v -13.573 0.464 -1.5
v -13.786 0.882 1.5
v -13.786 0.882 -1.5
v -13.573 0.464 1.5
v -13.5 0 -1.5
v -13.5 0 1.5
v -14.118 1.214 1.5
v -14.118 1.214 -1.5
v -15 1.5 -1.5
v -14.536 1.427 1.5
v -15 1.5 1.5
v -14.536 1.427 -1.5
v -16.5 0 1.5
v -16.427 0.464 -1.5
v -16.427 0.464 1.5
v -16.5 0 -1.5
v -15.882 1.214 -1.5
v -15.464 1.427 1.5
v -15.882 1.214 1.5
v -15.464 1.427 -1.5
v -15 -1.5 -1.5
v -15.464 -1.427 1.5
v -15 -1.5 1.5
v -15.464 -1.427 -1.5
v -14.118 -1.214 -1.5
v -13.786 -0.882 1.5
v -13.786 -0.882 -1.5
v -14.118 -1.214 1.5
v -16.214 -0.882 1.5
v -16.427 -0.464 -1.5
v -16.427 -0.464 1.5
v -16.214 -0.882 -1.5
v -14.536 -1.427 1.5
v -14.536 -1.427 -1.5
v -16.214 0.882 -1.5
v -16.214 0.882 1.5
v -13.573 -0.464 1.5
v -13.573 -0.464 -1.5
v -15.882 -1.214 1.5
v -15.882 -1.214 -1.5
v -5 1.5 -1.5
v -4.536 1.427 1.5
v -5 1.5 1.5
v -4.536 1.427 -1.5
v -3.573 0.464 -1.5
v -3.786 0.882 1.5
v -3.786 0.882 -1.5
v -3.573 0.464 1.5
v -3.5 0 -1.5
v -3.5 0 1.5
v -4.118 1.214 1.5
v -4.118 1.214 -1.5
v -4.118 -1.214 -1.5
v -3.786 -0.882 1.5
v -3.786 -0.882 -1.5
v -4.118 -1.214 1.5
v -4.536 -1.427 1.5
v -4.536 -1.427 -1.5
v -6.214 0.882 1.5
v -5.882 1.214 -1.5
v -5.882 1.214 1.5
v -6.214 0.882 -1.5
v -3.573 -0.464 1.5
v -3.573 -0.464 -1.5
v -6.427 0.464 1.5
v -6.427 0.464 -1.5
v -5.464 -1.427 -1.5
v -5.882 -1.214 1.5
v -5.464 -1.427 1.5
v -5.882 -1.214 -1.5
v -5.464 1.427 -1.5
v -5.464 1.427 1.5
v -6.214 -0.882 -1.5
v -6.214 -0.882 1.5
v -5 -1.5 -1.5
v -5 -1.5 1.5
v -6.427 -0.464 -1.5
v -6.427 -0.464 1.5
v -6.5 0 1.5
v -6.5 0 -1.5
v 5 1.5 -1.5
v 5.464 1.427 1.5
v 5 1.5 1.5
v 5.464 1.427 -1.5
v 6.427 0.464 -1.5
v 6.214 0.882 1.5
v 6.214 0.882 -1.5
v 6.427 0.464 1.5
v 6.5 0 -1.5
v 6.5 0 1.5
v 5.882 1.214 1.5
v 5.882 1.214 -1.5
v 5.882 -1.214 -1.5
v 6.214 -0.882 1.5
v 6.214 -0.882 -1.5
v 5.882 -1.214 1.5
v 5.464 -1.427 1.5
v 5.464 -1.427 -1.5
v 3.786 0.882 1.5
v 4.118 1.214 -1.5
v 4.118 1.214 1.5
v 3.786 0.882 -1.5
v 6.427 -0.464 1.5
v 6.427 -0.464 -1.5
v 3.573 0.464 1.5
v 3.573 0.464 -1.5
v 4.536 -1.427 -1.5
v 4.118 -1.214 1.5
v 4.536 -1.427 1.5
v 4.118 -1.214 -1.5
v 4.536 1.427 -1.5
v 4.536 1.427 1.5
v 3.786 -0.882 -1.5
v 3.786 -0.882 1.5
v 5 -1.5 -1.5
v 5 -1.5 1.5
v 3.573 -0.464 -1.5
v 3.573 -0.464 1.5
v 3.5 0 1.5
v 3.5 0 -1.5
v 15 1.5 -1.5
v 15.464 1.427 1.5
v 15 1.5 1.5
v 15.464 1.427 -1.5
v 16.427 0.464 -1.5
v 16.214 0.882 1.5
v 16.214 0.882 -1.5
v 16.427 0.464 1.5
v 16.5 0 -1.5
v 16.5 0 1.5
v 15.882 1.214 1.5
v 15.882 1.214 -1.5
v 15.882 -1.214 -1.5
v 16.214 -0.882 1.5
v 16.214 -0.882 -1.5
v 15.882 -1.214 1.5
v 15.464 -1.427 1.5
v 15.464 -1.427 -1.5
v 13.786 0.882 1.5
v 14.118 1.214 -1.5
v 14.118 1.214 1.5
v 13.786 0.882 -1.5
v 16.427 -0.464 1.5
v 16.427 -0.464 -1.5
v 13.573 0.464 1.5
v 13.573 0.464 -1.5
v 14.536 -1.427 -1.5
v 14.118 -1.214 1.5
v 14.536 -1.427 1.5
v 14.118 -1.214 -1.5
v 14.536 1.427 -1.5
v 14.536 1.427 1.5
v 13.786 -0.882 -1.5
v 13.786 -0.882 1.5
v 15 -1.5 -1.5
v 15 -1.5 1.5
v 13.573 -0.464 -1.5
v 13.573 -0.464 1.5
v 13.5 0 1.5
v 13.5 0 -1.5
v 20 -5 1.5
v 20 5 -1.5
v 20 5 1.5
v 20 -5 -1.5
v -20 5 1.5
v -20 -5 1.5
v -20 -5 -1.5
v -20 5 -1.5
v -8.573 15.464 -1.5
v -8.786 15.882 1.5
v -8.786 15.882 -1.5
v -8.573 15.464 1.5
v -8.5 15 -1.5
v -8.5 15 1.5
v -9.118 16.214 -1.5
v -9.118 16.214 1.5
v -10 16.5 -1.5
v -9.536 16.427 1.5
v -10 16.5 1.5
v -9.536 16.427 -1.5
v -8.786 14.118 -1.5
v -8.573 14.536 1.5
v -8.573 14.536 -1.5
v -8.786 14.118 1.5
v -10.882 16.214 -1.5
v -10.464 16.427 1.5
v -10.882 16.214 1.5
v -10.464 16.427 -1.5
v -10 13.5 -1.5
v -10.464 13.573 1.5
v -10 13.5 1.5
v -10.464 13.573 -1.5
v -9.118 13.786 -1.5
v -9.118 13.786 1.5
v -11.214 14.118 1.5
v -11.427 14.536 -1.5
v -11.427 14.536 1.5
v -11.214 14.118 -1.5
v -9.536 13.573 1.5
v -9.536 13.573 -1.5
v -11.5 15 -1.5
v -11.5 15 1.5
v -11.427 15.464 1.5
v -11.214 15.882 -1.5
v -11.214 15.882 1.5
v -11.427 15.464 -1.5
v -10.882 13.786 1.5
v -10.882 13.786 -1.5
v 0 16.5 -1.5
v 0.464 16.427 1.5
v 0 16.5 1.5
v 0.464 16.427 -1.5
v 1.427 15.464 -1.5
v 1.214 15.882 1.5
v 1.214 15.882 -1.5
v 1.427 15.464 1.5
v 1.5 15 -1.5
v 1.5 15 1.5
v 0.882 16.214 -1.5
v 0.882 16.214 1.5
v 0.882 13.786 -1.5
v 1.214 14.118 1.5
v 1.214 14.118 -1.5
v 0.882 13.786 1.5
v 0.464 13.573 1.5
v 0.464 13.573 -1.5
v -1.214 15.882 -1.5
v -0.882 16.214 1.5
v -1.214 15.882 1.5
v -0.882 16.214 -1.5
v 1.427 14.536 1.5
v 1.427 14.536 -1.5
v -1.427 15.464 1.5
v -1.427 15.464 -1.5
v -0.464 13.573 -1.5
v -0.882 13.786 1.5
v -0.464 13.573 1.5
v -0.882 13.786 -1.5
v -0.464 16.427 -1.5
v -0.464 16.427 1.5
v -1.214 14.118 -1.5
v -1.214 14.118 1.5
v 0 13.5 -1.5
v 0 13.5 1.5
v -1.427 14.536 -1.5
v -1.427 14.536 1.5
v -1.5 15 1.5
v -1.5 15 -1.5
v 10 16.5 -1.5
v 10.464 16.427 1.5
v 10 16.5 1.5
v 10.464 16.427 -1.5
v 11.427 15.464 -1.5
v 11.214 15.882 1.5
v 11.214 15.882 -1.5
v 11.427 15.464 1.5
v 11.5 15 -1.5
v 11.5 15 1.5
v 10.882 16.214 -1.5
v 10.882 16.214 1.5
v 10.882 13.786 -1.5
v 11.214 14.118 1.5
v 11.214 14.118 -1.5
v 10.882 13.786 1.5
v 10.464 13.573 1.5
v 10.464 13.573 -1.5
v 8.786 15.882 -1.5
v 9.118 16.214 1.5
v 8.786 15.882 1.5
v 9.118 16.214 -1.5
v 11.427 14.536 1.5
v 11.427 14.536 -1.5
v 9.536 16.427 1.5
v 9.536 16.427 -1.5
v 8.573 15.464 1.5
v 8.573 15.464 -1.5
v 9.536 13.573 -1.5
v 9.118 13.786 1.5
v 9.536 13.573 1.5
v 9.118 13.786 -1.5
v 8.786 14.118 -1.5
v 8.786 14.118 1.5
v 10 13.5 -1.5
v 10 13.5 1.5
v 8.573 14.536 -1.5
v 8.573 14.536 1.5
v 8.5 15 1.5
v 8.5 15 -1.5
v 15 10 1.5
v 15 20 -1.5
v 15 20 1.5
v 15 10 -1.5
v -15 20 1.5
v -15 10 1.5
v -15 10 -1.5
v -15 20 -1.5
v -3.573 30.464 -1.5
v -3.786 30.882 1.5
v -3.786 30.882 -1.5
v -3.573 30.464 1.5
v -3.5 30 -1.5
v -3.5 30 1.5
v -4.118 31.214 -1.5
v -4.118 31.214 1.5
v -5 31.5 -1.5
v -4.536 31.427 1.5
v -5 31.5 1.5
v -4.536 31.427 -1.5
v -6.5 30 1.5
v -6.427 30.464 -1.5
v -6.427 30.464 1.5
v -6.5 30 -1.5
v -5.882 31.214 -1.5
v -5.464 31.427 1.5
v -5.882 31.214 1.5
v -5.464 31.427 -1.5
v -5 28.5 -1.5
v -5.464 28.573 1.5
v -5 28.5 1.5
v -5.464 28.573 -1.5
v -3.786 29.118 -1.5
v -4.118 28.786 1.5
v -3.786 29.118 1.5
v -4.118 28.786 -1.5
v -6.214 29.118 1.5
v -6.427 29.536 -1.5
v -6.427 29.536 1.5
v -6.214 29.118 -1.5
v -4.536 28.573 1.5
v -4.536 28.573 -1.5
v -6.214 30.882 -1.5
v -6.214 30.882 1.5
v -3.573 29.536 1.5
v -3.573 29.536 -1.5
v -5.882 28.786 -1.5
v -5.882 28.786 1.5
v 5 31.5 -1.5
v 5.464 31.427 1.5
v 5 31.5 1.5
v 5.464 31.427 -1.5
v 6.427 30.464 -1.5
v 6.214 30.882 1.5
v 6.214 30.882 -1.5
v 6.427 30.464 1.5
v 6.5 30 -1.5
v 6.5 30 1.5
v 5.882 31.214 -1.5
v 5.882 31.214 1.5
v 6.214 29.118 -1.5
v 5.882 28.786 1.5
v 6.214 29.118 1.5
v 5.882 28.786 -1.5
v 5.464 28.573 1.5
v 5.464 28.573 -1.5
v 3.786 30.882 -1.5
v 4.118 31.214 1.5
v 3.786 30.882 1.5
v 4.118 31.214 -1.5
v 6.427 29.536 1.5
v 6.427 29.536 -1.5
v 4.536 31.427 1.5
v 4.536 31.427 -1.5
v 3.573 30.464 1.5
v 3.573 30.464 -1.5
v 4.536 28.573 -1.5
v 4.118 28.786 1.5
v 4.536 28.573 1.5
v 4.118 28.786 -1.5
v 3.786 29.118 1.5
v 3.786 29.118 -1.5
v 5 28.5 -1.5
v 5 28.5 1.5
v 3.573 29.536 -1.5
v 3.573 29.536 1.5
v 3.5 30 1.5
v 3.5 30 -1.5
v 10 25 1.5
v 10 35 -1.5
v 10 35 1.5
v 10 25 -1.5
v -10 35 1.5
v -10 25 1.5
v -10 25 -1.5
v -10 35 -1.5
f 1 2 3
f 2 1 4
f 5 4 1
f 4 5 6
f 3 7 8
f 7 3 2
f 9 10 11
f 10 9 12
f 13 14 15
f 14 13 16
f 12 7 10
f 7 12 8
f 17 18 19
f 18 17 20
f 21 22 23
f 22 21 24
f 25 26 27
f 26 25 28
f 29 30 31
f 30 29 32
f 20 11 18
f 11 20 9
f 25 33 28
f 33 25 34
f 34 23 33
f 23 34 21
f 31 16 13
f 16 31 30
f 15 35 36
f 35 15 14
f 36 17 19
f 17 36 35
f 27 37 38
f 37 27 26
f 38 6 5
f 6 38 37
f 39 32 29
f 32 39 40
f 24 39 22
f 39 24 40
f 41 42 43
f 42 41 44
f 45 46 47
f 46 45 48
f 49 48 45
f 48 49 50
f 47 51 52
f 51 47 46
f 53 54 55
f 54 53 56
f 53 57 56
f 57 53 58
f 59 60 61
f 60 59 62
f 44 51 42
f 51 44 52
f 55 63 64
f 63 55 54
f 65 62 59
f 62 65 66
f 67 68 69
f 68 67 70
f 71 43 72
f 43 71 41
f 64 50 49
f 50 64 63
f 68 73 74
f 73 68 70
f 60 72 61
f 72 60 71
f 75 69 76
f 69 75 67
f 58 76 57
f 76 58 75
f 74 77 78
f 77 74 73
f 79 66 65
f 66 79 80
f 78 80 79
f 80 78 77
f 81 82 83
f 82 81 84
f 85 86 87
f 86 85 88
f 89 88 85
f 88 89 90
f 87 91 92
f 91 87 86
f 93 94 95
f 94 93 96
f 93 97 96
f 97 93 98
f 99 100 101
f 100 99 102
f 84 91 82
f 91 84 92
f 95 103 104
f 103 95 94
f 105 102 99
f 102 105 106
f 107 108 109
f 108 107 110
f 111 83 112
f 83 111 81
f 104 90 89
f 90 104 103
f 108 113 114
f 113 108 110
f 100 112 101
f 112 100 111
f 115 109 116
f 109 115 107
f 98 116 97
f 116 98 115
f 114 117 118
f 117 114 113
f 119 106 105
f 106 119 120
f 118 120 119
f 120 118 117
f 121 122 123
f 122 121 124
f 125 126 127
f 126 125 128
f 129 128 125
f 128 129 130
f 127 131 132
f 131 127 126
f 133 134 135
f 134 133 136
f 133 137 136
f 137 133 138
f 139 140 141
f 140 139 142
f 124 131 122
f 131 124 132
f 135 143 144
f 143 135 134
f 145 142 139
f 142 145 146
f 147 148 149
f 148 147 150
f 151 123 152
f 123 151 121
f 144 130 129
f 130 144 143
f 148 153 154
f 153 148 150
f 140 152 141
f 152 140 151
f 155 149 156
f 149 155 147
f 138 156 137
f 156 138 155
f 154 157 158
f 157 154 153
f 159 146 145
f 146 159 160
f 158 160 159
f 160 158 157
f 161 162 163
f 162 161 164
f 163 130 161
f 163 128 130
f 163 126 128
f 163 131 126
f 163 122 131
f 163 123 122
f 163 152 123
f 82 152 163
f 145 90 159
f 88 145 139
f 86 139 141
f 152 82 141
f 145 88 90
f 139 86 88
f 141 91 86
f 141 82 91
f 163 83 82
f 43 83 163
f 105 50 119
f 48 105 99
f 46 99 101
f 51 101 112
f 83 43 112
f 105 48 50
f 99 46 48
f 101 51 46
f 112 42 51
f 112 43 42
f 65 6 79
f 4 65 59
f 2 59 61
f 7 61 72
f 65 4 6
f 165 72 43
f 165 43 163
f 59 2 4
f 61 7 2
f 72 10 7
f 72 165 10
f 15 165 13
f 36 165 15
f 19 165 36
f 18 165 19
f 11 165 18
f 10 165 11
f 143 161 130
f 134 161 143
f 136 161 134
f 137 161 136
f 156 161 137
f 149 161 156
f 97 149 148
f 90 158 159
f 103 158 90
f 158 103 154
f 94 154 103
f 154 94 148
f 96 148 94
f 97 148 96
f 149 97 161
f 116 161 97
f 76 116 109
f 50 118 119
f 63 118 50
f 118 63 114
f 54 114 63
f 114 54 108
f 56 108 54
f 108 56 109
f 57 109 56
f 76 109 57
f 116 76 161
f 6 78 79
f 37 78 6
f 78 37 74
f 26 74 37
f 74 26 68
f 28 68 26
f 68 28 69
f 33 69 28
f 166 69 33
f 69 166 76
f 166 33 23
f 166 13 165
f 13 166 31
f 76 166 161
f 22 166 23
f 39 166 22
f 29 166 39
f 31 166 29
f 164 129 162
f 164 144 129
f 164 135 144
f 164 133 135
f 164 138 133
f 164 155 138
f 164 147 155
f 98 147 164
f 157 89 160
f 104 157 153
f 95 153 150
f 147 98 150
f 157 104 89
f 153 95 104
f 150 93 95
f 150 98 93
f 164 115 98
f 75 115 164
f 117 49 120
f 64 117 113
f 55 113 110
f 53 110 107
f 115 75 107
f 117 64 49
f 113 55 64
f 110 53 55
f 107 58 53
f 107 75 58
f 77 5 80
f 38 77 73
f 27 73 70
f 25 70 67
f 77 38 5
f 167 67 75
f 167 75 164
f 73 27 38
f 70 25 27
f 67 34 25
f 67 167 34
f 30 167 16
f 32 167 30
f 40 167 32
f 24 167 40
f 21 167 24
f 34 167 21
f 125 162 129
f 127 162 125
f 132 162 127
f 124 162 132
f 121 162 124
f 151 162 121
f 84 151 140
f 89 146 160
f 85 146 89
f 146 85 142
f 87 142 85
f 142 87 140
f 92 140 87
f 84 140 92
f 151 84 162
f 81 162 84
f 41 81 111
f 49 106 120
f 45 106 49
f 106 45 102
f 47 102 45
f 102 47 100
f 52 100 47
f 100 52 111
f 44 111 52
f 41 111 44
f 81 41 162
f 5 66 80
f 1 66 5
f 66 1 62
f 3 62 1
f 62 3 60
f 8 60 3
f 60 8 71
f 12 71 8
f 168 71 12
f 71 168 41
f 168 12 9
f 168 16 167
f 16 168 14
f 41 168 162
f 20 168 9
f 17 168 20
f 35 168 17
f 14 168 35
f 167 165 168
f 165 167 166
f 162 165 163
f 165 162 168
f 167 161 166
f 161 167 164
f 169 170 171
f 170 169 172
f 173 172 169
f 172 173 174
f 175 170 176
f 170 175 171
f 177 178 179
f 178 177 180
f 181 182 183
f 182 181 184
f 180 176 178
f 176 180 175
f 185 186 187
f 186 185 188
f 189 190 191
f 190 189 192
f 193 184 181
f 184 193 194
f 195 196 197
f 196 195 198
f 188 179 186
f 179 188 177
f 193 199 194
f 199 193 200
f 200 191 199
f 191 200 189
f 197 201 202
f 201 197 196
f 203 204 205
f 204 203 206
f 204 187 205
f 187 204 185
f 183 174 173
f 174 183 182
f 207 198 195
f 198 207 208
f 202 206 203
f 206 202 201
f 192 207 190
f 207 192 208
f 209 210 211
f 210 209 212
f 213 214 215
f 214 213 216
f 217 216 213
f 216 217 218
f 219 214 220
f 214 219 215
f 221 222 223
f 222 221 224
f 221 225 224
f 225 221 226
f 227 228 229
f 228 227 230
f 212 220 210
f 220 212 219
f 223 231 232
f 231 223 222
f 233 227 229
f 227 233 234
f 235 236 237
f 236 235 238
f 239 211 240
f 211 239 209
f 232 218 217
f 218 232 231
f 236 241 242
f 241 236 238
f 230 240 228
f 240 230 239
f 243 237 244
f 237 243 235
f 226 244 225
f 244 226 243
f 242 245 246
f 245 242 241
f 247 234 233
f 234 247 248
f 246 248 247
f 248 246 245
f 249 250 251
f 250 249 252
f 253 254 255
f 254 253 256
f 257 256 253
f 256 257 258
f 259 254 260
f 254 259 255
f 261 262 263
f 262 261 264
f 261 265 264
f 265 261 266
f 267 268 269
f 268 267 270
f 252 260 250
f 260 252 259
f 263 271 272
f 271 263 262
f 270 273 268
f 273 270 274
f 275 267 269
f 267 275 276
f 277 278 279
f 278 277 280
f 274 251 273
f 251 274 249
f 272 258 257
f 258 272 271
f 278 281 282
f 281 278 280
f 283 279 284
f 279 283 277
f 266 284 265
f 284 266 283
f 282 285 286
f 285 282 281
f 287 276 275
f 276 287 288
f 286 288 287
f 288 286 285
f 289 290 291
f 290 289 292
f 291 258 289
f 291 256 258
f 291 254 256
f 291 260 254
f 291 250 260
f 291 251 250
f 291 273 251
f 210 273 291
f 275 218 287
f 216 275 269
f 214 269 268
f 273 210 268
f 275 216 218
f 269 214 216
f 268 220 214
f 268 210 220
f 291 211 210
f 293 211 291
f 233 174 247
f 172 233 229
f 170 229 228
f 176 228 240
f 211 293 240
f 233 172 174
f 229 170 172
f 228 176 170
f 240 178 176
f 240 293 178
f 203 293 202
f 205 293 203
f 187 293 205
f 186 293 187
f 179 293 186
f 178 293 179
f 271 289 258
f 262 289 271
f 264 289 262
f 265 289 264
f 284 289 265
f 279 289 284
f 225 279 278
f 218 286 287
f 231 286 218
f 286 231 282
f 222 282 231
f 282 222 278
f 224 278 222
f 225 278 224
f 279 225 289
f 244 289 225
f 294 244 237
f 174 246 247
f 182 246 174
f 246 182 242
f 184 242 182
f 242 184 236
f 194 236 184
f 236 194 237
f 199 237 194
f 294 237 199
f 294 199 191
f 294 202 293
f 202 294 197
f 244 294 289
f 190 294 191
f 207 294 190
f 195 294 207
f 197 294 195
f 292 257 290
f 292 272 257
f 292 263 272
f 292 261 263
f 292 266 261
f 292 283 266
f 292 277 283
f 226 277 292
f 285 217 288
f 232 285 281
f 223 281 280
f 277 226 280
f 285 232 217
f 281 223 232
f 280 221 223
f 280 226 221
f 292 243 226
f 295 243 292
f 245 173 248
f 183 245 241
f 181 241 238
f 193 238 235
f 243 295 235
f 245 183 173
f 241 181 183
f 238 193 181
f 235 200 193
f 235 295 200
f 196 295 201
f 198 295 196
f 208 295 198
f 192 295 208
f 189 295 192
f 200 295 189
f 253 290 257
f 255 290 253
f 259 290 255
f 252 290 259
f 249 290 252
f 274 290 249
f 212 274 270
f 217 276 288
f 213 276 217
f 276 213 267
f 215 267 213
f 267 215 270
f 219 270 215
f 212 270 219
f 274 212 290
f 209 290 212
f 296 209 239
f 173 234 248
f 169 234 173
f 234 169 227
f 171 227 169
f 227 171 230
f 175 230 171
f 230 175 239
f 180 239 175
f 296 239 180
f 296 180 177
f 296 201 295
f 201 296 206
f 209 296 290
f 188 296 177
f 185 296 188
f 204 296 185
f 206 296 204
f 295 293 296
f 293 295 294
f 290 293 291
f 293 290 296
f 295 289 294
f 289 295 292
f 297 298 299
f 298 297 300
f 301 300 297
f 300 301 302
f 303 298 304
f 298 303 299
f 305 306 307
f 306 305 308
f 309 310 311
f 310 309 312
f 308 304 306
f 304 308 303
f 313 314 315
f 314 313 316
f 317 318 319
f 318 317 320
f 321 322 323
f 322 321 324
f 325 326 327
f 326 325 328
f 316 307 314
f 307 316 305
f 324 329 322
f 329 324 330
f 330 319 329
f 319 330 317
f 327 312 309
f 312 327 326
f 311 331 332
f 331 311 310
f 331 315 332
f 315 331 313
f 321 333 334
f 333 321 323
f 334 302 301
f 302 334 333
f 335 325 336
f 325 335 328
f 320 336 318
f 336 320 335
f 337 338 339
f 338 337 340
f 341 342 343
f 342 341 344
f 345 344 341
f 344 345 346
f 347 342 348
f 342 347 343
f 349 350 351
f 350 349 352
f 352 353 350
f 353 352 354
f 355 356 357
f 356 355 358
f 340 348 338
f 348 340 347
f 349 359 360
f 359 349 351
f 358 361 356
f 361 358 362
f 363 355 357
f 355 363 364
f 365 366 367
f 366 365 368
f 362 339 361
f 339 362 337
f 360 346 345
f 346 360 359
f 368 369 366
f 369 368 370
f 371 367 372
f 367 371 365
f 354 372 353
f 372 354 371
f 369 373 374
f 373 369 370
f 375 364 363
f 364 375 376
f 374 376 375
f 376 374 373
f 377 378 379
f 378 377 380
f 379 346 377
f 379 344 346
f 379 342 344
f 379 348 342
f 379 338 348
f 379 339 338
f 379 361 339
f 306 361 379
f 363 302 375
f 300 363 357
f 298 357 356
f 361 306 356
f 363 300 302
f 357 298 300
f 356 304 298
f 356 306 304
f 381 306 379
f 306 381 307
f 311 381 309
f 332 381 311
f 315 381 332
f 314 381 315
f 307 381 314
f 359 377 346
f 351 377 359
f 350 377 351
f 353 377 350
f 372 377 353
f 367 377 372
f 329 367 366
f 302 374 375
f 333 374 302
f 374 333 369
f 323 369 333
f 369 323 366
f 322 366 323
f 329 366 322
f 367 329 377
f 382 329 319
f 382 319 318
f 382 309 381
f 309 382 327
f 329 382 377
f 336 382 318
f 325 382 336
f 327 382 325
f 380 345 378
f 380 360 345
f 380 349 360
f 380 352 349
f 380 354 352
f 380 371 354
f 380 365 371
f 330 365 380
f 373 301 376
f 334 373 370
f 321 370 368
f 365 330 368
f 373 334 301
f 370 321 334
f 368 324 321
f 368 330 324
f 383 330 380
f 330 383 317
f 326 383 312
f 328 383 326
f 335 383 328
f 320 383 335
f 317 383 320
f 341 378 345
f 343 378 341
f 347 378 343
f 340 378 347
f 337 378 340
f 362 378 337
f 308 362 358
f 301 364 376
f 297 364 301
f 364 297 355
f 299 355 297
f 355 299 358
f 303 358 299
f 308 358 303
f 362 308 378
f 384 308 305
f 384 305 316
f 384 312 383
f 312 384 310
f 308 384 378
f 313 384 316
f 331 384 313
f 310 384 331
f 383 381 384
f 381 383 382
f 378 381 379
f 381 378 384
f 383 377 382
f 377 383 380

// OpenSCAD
// file: pieza_mecano.scad
module pieza_mecano(drill=3, d=10, n=4, anchura=10,grosor=3){
  
    //-- Calcular la longitud de la pieza
    lx= n*d;

    //--Construimos la pieza
    difference(){
        //-- Cuerpo de la pieza
        cube([lx,anchura,grosor],center=true);
    
        //-- Taladros
        translate([-lx/2+d/2,0,0])
        for(i=[0:n-1]){ 
            translate([i*d,0,0])
                cylinder(r=drill/2, h=grosor+5, $fn=20, center=true);
    }
    }
}

//-- Ejemplos de utilización
color("red")
pieza_mecano(n=5);

color("green")
translate([0,20,0])
    pieza_mecano(n=2);
// main file
use <pieza_mecano.scad>

pieza_mecano();

translate([0,15,0])
    pieza_mecano(n=3);
    
translate([0,30,0])
    pieza_mecano(n=2);
